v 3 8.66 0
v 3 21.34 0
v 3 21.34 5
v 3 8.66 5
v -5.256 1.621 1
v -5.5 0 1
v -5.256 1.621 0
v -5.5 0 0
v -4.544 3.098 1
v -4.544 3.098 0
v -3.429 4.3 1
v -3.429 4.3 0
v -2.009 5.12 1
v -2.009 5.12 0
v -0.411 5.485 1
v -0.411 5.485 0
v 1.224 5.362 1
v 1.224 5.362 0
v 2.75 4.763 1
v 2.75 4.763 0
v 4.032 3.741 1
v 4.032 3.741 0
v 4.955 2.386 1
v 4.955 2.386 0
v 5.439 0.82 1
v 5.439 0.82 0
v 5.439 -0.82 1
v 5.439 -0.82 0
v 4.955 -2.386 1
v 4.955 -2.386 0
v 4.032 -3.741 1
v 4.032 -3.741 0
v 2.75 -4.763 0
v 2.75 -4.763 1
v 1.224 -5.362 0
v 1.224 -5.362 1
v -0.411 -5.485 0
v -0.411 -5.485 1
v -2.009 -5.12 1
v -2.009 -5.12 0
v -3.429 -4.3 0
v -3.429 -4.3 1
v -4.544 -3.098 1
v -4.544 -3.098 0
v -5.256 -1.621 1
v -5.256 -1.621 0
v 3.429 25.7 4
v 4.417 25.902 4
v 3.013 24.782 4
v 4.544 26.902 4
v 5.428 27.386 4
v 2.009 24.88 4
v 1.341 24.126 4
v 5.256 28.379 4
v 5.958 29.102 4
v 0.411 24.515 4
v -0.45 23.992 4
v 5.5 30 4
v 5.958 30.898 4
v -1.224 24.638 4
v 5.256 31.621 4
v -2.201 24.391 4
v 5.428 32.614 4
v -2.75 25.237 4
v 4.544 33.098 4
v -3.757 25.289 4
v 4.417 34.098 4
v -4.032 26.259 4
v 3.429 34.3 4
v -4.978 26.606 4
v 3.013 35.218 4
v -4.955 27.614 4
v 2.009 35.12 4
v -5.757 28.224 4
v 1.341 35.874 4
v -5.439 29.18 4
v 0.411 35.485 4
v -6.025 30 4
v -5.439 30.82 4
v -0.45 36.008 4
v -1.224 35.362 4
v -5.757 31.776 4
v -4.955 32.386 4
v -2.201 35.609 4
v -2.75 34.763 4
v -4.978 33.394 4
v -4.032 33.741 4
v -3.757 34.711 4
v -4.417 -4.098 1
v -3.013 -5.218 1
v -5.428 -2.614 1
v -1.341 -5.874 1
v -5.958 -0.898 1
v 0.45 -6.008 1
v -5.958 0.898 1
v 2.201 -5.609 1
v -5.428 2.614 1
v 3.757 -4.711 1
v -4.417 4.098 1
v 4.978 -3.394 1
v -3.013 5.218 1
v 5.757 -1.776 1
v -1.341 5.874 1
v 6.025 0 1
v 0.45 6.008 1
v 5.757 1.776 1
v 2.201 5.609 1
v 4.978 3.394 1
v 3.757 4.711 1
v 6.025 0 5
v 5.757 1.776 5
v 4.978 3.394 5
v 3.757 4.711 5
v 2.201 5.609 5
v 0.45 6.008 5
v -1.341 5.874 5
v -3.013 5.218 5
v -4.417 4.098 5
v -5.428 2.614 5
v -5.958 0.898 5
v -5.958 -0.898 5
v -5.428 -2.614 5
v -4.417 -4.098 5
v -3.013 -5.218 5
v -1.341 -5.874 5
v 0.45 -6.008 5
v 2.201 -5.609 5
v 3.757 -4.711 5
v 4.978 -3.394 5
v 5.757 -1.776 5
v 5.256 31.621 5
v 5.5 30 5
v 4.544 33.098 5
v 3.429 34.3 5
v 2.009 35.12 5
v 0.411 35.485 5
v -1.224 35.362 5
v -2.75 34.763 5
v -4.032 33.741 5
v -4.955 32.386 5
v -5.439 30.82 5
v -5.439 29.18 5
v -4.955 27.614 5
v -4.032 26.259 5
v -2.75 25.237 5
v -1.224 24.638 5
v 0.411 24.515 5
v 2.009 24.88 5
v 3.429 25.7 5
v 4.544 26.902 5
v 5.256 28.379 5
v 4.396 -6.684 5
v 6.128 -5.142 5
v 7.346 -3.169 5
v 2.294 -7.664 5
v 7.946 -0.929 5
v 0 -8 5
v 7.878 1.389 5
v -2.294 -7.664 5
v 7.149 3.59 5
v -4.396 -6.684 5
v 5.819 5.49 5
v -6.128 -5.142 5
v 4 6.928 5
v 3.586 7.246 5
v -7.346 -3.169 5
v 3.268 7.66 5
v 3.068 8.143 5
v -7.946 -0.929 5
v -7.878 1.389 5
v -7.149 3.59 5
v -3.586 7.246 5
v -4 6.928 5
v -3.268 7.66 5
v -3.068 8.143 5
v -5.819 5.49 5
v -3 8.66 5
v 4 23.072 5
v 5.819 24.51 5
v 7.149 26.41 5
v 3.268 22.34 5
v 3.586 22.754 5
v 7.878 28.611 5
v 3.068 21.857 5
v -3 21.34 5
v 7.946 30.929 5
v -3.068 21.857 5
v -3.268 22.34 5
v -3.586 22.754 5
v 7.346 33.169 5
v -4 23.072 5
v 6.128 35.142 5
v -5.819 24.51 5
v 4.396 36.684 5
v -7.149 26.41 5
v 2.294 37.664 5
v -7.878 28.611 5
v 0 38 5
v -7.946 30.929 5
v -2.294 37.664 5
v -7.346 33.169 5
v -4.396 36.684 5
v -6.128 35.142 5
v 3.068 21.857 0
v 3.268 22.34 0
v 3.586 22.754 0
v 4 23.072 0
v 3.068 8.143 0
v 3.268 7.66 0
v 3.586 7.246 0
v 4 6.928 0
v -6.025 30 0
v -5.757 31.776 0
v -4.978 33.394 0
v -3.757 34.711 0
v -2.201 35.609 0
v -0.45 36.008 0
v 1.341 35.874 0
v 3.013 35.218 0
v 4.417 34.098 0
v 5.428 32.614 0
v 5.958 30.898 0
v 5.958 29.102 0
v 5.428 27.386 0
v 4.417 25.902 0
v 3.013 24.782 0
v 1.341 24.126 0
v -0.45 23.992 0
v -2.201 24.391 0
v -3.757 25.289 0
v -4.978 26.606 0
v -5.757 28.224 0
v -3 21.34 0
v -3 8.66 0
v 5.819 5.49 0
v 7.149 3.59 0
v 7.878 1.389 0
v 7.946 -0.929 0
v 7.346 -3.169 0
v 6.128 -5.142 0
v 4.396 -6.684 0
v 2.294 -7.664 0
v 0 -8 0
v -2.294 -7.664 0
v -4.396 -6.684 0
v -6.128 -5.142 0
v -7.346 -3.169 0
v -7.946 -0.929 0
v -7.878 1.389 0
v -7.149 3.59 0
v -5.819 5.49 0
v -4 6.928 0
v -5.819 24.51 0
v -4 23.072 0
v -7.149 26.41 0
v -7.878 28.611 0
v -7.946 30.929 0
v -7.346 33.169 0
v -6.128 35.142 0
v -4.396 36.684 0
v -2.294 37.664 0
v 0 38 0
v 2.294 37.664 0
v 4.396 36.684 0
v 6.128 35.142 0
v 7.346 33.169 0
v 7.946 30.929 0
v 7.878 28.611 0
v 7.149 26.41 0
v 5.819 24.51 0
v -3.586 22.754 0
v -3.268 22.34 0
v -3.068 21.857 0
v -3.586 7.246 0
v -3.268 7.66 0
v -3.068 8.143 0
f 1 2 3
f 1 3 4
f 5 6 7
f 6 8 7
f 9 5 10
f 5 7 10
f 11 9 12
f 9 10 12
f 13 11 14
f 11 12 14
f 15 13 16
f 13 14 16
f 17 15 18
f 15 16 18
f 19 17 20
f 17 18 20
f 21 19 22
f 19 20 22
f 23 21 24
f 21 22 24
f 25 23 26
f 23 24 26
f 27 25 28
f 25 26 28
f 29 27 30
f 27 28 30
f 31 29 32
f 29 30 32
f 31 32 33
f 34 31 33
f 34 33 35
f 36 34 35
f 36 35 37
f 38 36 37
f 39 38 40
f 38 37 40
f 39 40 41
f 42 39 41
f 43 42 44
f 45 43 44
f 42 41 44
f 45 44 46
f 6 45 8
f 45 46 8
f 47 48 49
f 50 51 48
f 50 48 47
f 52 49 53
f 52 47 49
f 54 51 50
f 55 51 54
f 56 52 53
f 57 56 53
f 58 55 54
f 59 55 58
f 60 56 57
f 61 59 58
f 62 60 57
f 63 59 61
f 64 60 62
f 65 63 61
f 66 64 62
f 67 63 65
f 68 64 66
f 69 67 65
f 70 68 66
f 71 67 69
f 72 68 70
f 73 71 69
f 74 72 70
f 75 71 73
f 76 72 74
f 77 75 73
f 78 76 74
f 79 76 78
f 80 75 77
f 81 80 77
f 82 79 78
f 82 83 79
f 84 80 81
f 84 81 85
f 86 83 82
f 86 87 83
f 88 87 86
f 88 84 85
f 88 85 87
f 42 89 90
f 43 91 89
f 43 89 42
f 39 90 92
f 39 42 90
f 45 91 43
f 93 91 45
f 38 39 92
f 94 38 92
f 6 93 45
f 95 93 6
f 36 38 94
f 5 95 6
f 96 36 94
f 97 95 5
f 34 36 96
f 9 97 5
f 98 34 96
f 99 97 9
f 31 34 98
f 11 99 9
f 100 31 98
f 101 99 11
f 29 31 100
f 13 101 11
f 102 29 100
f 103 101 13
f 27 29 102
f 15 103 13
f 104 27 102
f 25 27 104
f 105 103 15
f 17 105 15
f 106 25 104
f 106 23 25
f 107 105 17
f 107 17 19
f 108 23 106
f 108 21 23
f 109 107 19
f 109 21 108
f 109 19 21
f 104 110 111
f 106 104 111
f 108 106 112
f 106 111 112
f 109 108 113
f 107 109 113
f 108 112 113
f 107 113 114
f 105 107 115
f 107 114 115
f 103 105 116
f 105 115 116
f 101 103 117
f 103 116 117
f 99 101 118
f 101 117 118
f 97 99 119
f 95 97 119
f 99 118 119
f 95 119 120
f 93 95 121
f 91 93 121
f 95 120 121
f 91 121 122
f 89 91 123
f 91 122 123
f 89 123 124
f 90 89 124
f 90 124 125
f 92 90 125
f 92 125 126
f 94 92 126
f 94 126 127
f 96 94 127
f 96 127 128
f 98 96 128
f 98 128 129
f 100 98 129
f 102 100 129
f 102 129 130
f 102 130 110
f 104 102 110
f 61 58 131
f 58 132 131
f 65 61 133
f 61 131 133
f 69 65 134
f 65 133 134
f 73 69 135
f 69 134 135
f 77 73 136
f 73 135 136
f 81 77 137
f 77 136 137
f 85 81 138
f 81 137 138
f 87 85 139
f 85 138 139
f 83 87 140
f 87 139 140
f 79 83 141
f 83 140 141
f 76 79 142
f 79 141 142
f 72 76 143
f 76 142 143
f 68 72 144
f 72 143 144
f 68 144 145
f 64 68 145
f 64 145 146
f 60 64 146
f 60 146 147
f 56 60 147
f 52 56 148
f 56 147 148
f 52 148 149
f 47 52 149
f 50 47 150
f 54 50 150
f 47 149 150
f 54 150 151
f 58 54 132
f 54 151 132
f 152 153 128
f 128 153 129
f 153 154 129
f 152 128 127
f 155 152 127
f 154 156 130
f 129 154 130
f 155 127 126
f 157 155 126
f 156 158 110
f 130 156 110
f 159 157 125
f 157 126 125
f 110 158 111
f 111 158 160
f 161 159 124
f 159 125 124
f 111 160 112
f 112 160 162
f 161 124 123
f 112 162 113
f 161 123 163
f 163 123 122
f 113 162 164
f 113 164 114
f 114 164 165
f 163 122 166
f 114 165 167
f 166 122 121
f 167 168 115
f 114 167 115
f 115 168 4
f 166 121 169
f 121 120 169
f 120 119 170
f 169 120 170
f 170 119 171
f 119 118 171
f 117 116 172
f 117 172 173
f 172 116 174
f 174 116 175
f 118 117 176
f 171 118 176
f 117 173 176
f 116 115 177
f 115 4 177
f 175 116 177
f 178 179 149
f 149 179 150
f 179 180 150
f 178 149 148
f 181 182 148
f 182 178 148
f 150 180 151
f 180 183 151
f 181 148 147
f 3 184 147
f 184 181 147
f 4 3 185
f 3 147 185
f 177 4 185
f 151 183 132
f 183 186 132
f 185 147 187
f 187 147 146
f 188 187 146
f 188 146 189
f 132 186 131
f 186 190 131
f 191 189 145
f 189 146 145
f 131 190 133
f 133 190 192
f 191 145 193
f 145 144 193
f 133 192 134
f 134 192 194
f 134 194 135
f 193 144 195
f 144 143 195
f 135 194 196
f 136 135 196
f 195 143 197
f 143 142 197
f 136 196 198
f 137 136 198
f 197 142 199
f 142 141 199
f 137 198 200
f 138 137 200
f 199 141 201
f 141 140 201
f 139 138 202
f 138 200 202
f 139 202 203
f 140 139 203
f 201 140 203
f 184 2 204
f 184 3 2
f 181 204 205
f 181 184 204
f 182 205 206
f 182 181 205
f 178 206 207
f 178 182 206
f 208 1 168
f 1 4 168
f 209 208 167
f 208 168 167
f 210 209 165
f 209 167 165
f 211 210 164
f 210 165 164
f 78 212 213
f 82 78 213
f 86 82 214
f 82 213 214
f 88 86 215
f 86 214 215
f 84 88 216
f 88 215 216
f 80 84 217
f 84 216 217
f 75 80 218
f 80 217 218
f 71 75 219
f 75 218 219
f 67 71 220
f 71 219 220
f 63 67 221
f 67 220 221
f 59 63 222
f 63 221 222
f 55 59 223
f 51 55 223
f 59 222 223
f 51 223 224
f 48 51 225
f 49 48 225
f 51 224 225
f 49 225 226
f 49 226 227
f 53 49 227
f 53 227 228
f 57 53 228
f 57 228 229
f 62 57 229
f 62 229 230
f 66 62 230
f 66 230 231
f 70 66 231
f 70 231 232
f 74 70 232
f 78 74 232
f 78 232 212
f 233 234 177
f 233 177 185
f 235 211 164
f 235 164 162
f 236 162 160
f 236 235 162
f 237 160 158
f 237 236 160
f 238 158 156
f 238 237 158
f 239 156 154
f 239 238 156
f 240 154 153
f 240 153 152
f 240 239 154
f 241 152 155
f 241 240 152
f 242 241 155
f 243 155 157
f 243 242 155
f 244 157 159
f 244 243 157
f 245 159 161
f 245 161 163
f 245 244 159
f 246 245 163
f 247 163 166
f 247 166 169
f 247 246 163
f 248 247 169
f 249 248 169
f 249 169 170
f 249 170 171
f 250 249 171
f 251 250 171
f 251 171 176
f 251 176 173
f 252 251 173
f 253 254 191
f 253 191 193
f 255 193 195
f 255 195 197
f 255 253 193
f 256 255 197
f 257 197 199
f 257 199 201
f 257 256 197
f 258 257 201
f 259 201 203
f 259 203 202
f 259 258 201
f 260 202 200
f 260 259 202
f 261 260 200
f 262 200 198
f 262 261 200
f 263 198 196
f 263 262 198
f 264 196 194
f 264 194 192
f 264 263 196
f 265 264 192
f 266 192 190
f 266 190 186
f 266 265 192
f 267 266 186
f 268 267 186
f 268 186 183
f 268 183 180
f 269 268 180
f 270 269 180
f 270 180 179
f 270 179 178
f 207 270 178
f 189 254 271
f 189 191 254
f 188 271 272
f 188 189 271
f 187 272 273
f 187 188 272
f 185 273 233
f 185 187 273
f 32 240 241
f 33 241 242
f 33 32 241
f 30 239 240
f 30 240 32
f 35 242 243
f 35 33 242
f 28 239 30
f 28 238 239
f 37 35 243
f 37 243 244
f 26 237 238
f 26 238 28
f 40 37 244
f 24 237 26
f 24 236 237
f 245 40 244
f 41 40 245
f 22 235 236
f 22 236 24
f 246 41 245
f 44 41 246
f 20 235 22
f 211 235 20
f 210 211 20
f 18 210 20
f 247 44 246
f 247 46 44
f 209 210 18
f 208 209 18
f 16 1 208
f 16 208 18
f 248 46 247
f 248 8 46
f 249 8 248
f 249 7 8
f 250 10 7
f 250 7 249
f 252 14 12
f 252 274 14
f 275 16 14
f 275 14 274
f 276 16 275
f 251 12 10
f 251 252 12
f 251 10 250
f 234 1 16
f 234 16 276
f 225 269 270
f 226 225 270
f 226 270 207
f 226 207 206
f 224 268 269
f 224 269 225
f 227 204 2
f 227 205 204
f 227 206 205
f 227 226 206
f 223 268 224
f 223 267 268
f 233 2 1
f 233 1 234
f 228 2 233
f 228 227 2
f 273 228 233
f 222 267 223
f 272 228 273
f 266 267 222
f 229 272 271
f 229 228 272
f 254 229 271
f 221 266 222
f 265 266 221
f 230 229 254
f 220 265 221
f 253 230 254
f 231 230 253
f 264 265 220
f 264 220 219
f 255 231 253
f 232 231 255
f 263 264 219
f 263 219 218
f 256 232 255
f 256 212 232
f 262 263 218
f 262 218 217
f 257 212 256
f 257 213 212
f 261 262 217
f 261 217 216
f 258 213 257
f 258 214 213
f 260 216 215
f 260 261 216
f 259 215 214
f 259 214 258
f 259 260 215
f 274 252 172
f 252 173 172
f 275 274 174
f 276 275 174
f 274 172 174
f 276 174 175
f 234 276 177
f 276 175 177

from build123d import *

# Parameters (mm, degrees)
EXTRUDE_1_DEPTH               = 5
HOLE_WIZARD_M10_1_D           = 11
HOLE_WIZARD_M10_1_CBORE_D     = 12.05
HOLE_WIZARD_M10_1_CBORE_DEPTH = 4
HOLE_WIZARD_M10_2_D           = 11
HOLE_WIZARD_M10_2_CBORE_D     = 12.05
HOLE_WIZARD_M10_2_CBORE_DEPTH = 4
FILLET_1_R                    = 2


with BuildPart() as part:
    # 草图1 → 凸台-拉伸1 (new body)
    with BuildSketch(Plane(origin=(0, 0, 0), x_dir=(-1, 0, 0), z_dir=(0, 0, -1))):
        with BuildLine():
            Line((-3, 22.583801513), (-3, 7.416198487))
            ThreePointArc((-3, 7.416198487), (0, -8), (3, 7.416198487))
            Line((3, 7.416198487), (3, 22.583801513))
            ThreePointArc((3, 22.583801513), (0, 38), (-3, 22.583801513))
        make_face()
    extrude(amount=-EXTRUDE_1_DEPTH)

    # M10 六角头螺栓的柱形沉头孔1 (through all)
    with Locations(Plane(origin=(0, 0, 0), x_dir=(-1, 0, 0), z_dir=(0, 0, -1))):
        with Locations((0, 30)):
            CounterBoreHole(HOLE_WIZARD_M10_1_D / 2, HOLE_WIZARD_M10_1_CBORE_D / 2, HOLE_WIZARD_M10_1_CBORE_DEPTH)

    # M10 六角头螺栓的柱形沉头孔2 (through all)
    with Locations(Plane.XY.offset(5)):
        with Locations((0, 0)):
            CounterBoreHole(HOLE_WIZARD_M10_2_D / 2, HOLE_WIZARD_M10_2_CBORE_D / 2, HOLE_WIZARD_M10_2_CBORE_DEPTH)

    # 圆角1
    fillet_1_edges = [part.edges().sort_by_distance(p)[0] for p in [
        (-3, 22.583801513, 2.5),
        (-3, 7.416198487, 2.5),
        (3, 7.416198487, 2.5),
        (3, 22.583801513, 2.5),
    ]]
    fillet(fillet_1_edges, radius=FILLET_1_R)


solid = part.part
